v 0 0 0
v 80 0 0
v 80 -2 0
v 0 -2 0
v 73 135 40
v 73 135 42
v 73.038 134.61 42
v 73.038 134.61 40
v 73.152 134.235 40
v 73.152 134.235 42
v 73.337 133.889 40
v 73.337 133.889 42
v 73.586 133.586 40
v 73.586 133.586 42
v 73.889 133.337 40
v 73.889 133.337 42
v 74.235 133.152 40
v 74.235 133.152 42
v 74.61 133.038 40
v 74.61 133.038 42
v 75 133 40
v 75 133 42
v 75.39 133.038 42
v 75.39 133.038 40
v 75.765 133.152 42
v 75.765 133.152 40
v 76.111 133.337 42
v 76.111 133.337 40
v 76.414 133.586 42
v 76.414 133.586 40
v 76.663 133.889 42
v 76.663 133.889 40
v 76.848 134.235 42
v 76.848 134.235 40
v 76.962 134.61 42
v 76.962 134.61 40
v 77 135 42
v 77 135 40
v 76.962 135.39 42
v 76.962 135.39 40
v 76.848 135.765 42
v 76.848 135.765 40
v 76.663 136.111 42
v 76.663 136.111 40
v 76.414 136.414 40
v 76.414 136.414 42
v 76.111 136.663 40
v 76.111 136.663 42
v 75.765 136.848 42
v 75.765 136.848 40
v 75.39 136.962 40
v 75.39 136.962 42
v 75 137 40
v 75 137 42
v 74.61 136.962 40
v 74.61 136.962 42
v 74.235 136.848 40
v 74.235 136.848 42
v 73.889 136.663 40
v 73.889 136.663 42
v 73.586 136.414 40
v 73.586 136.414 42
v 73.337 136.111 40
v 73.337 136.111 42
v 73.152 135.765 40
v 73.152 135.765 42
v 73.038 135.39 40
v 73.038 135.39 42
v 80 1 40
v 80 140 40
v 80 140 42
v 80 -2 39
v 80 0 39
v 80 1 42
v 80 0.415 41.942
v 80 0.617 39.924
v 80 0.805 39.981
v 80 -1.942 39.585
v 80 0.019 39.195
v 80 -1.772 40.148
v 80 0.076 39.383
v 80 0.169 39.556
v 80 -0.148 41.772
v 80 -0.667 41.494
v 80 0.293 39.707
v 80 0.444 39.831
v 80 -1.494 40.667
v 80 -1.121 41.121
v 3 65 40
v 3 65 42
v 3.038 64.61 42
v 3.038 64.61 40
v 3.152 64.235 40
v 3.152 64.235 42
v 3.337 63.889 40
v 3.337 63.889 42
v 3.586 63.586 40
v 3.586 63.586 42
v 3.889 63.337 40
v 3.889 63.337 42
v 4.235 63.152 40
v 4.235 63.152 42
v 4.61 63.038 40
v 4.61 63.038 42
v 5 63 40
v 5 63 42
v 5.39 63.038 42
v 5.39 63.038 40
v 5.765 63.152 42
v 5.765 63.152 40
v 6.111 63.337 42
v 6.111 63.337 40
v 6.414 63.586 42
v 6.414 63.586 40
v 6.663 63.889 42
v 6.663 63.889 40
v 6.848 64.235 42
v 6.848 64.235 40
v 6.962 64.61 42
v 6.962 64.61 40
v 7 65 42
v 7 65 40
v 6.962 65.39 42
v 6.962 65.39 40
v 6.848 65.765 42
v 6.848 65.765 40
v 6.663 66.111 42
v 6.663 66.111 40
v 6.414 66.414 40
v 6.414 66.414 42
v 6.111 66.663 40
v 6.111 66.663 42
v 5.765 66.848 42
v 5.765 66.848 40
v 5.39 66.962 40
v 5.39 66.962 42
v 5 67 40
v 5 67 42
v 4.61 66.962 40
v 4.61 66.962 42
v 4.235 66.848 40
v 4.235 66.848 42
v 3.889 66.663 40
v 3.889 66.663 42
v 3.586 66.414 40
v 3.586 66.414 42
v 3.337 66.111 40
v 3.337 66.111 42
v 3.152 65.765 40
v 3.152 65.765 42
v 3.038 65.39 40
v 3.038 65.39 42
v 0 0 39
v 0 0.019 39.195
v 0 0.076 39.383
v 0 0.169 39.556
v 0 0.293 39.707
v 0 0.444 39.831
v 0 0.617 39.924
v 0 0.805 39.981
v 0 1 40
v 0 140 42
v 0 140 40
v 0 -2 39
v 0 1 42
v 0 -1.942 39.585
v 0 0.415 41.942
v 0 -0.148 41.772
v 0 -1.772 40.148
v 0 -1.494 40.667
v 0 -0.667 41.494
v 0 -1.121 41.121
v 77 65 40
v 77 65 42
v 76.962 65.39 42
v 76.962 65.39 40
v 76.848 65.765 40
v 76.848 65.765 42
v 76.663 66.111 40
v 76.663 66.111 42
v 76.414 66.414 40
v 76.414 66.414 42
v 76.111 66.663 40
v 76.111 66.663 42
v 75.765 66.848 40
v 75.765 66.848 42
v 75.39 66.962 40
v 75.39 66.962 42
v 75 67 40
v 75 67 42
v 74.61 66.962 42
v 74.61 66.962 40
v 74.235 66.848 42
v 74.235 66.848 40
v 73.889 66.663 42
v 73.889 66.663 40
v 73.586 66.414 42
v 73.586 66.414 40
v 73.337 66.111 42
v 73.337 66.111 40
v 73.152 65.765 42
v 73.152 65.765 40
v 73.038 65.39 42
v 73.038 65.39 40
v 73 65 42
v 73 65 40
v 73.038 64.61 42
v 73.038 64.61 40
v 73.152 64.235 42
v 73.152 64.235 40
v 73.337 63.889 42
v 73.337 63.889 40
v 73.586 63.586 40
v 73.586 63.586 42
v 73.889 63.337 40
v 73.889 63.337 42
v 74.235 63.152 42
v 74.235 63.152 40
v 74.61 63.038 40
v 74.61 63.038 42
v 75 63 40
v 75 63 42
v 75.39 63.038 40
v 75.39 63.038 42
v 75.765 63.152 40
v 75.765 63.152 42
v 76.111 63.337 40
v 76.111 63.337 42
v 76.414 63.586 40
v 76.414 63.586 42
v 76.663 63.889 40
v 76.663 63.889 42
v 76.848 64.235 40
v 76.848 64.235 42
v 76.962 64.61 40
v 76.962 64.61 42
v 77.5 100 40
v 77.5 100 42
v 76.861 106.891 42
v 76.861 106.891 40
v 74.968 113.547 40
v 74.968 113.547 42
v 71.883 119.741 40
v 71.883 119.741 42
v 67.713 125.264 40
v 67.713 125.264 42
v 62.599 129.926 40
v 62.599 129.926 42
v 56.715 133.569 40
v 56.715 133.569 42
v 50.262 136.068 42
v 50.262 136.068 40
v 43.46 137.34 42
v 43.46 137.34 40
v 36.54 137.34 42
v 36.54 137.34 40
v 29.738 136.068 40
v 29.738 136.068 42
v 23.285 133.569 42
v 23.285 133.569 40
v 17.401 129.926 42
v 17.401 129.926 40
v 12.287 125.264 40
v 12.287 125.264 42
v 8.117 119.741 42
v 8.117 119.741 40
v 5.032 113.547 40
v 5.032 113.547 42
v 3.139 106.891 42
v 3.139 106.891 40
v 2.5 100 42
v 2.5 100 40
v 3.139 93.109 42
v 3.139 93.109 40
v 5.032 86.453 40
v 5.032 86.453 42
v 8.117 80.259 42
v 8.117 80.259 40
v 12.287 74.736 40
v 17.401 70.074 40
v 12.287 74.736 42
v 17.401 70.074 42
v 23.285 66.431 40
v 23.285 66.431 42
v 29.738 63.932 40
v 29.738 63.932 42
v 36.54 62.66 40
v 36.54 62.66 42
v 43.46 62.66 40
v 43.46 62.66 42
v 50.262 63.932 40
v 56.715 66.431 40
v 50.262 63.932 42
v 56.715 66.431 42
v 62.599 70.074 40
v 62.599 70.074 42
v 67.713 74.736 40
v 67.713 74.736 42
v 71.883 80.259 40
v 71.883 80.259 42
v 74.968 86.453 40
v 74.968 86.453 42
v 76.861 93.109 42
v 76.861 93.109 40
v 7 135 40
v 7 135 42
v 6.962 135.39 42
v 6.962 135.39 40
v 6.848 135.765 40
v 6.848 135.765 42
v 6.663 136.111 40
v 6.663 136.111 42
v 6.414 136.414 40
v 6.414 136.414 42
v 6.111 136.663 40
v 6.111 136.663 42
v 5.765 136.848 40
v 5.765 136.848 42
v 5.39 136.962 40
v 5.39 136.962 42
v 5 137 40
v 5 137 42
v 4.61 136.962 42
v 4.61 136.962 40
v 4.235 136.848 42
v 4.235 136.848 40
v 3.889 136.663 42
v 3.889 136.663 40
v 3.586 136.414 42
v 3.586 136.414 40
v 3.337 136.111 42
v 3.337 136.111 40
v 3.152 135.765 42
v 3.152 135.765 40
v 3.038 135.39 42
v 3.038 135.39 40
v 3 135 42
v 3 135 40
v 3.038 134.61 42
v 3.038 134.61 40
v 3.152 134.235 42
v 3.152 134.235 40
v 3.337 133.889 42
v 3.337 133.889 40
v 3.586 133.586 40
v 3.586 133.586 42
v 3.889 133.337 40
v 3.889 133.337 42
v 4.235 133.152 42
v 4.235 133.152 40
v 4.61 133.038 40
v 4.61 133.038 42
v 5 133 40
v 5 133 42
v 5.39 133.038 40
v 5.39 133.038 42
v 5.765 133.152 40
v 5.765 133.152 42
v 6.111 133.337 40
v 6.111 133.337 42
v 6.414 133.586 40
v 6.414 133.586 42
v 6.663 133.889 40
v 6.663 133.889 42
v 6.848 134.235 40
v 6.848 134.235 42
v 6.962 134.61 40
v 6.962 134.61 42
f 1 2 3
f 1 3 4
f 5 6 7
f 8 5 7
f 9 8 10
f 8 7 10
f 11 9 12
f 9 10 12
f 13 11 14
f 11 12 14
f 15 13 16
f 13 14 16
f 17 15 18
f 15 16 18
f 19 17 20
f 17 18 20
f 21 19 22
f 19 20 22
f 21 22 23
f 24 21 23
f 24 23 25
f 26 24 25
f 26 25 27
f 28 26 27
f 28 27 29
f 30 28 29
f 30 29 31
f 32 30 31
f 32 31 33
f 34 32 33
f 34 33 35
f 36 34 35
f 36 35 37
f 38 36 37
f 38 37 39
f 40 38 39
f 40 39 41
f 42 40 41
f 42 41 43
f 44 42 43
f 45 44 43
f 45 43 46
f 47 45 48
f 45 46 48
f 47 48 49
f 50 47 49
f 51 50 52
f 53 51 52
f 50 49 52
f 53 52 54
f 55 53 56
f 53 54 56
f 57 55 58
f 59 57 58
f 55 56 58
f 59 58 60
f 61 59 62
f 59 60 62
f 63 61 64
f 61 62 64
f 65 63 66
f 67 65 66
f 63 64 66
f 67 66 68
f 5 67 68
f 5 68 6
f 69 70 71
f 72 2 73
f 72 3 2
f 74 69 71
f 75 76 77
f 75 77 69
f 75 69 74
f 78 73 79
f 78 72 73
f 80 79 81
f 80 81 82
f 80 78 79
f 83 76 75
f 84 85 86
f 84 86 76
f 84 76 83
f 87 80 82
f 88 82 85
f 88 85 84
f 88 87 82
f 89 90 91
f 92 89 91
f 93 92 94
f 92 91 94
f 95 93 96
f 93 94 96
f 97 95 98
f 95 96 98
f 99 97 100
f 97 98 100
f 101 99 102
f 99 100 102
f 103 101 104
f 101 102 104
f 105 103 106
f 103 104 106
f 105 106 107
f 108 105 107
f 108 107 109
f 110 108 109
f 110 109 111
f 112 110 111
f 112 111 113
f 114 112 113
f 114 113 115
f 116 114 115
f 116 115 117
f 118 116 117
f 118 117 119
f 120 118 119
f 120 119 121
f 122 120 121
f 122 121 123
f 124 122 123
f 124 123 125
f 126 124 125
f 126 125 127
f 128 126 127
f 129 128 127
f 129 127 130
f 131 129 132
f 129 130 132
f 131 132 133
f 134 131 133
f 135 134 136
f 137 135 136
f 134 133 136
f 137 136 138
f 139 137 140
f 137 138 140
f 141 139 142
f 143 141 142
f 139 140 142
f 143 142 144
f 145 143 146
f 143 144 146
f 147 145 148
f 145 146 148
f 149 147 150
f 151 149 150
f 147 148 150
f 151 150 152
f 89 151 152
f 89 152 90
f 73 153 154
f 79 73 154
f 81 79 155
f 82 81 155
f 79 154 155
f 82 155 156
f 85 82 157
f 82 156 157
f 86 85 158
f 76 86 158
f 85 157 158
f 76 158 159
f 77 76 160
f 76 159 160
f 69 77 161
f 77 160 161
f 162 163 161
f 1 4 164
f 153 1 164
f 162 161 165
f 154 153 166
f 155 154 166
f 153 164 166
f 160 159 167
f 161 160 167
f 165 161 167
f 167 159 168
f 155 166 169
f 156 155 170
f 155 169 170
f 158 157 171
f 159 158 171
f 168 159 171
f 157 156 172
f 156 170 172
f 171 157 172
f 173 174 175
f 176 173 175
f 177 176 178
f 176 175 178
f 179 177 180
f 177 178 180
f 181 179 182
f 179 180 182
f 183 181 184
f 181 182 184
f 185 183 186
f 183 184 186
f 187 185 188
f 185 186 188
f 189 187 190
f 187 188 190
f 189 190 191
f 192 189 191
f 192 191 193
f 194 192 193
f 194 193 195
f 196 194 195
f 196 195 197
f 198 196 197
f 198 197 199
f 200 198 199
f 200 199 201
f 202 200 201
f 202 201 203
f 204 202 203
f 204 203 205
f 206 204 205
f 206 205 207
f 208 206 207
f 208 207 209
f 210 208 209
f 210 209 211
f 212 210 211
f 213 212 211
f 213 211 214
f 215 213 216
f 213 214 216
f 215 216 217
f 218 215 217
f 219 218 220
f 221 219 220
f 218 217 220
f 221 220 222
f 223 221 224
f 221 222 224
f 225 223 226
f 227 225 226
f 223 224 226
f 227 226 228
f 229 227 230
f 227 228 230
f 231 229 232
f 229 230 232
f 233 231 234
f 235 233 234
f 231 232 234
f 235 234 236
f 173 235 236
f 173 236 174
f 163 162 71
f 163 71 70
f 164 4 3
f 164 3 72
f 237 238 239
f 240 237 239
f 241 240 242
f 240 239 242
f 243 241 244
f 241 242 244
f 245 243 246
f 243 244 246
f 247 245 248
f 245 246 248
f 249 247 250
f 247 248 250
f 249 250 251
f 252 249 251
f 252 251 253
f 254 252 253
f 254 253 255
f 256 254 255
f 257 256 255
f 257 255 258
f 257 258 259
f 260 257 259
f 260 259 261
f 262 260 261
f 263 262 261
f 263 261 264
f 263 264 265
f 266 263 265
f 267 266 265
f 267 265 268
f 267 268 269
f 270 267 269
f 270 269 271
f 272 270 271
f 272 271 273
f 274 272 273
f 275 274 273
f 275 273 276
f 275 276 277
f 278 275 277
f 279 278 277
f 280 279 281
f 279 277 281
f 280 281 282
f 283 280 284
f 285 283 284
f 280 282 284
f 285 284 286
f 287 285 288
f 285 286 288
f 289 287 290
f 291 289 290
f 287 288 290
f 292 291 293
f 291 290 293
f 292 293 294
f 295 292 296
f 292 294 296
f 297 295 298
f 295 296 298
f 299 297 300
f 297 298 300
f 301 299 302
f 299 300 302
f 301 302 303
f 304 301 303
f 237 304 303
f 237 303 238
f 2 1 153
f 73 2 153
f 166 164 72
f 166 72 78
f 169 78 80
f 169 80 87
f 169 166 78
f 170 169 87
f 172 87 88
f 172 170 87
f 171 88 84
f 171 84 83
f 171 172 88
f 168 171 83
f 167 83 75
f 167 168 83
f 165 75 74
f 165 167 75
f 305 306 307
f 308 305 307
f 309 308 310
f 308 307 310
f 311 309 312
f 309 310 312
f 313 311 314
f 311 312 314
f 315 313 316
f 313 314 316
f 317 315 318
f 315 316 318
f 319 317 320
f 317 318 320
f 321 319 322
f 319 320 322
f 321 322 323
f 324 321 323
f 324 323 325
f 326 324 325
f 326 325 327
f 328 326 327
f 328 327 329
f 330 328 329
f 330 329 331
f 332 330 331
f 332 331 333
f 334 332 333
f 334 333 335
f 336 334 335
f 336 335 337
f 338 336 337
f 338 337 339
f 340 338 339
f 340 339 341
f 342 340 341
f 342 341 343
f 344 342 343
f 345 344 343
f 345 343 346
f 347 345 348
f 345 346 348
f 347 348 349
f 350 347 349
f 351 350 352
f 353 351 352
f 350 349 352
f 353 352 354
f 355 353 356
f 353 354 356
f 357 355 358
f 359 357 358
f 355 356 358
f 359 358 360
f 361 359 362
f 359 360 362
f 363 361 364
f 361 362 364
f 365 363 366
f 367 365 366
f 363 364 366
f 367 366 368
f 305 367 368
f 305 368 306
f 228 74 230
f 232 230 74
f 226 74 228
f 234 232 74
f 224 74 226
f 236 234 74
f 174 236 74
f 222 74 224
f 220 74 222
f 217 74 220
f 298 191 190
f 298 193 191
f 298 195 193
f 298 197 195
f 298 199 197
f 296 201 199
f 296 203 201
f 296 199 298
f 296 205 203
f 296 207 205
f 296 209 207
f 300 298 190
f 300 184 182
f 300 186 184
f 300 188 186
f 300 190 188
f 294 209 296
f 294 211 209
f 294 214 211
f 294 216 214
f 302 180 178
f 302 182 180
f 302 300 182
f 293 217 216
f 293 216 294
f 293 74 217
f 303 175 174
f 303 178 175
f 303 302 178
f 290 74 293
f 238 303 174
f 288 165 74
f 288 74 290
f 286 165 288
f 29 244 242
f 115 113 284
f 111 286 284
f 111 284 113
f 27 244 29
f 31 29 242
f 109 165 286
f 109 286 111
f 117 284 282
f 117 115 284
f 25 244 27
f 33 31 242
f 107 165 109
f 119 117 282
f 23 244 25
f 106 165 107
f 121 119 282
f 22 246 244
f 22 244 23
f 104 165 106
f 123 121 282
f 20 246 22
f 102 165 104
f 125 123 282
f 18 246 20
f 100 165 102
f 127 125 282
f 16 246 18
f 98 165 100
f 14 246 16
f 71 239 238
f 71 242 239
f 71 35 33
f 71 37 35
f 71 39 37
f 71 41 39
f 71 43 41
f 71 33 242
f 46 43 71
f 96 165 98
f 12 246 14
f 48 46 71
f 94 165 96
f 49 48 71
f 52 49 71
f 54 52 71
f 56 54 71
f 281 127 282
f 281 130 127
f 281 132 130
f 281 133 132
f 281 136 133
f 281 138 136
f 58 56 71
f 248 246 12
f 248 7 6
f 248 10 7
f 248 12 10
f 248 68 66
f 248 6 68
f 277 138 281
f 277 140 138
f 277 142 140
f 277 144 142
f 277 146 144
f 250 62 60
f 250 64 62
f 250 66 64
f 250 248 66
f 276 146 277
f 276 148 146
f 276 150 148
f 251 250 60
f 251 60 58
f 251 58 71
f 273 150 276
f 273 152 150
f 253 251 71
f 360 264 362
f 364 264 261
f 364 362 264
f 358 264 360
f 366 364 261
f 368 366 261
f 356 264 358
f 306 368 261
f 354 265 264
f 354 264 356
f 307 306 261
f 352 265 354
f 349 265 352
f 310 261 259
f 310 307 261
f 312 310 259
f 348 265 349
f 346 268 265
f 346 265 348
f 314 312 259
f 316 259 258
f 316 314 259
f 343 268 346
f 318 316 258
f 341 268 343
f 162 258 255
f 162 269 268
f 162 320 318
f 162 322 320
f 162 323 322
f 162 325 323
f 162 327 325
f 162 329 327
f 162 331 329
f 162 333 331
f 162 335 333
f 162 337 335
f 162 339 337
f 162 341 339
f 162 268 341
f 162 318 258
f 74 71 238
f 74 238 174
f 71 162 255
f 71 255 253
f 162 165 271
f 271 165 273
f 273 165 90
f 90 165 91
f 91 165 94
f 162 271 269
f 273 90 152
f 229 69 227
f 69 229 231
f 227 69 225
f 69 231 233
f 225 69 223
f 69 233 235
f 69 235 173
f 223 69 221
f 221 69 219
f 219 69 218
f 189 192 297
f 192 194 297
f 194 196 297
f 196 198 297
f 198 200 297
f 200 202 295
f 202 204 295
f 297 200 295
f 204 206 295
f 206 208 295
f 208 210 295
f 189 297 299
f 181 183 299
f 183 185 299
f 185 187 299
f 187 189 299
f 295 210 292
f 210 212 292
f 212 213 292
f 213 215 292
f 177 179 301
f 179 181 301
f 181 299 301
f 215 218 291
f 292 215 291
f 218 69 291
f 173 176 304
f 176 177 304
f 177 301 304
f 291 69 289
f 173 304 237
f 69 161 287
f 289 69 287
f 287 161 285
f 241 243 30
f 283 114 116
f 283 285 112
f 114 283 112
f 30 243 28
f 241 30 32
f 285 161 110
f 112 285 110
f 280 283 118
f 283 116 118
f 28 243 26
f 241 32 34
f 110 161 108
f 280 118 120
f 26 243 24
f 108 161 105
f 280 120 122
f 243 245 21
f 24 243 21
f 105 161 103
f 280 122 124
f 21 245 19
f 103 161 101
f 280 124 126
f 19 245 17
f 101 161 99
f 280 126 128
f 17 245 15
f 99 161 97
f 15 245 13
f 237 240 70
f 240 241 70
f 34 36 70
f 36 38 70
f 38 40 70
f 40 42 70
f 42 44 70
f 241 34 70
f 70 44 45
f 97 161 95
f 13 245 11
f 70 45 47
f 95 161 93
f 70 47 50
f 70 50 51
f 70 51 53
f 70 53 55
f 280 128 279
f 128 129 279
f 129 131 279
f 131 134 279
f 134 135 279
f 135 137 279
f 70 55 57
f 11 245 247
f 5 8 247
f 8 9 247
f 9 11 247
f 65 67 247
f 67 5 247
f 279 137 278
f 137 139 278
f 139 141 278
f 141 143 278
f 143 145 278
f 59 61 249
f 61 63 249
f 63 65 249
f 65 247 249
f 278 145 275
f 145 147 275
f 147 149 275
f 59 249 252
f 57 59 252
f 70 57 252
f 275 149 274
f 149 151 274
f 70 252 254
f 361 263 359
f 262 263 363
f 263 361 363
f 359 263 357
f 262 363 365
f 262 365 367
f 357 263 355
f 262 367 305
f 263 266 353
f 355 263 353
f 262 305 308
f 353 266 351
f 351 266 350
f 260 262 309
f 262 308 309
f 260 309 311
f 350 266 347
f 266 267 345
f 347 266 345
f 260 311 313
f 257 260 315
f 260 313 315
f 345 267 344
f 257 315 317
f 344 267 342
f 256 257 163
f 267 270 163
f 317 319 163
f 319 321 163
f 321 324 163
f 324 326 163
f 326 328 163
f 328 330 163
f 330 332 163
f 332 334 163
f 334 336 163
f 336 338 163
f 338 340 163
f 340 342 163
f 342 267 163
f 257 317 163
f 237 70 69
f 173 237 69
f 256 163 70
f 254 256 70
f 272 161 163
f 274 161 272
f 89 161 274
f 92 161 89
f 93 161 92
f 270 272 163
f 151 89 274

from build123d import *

# Parameters (mm, degrees)
SUPERFICIE_EXTRUIR1_1_DEPTH = 80
DAR_ESPESOR1_T1             = 2
CROQUIS2_R                  = 37.5
CROQUIS2_R_2                = 2
EXTRUIR1_DEPTH              = 80


with BuildPart() as body_1:
    # Superficie-Extruir1: a surface, the sketch's curves swept straight by 80 mm
    with BuildLine(Plane(origin=(0, 0, 0), x_dir=(0, 0, -1), z_dir=(1, 0, 0)), mode=Mode.PRIVATE) as superficie_extruir1_1_path:
        Line((0, 0), (-39, 0))
        ThreePointArc((-39, 0), (-39.707106781, 0.292893219), (-40, 1))
        Line((-40, 1), (-40, 140))
    superficie_extruir1_1 = Shell.extrude(superficie_extruir1_1_path.wire(), (1 * SUPERFICIE_EXTRUIR1_1_DEPTH, 0 * SUPERFICIE_EXTRUIR1_1_DEPTH, 0 * SUPERFICIE_EXTRUIR1_1_DEPTH))
    add(Solid.thicken(superficie_extruir1_1, DAR_ESPESOR1_T1))

    # Croquis2 → Extruir1 (cut)
    with BuildSketch(Plane.XY.offset(42)):
        with Locations((40, 100)):
            Circle(CROQUIS2_R)
        with Locations((5, 135)):
            Circle(CROQUIS2_R_2)
        with Locations(Location((75, 135, 0), (0, 0, 180))):
            Circle(CROQUIS2_R_2)
        with Locations((75, 65)):
            Circle(CROQUIS2_R_2)
        with Locations(Location((5, 65, 0), (0, 0, 180))):
            Circle(CROQUIS2_R_2)
    extrude(amount=-EXTRUIR1_DEPTH, mode=Mode.SUBTRACT)


solid = body_1.part
